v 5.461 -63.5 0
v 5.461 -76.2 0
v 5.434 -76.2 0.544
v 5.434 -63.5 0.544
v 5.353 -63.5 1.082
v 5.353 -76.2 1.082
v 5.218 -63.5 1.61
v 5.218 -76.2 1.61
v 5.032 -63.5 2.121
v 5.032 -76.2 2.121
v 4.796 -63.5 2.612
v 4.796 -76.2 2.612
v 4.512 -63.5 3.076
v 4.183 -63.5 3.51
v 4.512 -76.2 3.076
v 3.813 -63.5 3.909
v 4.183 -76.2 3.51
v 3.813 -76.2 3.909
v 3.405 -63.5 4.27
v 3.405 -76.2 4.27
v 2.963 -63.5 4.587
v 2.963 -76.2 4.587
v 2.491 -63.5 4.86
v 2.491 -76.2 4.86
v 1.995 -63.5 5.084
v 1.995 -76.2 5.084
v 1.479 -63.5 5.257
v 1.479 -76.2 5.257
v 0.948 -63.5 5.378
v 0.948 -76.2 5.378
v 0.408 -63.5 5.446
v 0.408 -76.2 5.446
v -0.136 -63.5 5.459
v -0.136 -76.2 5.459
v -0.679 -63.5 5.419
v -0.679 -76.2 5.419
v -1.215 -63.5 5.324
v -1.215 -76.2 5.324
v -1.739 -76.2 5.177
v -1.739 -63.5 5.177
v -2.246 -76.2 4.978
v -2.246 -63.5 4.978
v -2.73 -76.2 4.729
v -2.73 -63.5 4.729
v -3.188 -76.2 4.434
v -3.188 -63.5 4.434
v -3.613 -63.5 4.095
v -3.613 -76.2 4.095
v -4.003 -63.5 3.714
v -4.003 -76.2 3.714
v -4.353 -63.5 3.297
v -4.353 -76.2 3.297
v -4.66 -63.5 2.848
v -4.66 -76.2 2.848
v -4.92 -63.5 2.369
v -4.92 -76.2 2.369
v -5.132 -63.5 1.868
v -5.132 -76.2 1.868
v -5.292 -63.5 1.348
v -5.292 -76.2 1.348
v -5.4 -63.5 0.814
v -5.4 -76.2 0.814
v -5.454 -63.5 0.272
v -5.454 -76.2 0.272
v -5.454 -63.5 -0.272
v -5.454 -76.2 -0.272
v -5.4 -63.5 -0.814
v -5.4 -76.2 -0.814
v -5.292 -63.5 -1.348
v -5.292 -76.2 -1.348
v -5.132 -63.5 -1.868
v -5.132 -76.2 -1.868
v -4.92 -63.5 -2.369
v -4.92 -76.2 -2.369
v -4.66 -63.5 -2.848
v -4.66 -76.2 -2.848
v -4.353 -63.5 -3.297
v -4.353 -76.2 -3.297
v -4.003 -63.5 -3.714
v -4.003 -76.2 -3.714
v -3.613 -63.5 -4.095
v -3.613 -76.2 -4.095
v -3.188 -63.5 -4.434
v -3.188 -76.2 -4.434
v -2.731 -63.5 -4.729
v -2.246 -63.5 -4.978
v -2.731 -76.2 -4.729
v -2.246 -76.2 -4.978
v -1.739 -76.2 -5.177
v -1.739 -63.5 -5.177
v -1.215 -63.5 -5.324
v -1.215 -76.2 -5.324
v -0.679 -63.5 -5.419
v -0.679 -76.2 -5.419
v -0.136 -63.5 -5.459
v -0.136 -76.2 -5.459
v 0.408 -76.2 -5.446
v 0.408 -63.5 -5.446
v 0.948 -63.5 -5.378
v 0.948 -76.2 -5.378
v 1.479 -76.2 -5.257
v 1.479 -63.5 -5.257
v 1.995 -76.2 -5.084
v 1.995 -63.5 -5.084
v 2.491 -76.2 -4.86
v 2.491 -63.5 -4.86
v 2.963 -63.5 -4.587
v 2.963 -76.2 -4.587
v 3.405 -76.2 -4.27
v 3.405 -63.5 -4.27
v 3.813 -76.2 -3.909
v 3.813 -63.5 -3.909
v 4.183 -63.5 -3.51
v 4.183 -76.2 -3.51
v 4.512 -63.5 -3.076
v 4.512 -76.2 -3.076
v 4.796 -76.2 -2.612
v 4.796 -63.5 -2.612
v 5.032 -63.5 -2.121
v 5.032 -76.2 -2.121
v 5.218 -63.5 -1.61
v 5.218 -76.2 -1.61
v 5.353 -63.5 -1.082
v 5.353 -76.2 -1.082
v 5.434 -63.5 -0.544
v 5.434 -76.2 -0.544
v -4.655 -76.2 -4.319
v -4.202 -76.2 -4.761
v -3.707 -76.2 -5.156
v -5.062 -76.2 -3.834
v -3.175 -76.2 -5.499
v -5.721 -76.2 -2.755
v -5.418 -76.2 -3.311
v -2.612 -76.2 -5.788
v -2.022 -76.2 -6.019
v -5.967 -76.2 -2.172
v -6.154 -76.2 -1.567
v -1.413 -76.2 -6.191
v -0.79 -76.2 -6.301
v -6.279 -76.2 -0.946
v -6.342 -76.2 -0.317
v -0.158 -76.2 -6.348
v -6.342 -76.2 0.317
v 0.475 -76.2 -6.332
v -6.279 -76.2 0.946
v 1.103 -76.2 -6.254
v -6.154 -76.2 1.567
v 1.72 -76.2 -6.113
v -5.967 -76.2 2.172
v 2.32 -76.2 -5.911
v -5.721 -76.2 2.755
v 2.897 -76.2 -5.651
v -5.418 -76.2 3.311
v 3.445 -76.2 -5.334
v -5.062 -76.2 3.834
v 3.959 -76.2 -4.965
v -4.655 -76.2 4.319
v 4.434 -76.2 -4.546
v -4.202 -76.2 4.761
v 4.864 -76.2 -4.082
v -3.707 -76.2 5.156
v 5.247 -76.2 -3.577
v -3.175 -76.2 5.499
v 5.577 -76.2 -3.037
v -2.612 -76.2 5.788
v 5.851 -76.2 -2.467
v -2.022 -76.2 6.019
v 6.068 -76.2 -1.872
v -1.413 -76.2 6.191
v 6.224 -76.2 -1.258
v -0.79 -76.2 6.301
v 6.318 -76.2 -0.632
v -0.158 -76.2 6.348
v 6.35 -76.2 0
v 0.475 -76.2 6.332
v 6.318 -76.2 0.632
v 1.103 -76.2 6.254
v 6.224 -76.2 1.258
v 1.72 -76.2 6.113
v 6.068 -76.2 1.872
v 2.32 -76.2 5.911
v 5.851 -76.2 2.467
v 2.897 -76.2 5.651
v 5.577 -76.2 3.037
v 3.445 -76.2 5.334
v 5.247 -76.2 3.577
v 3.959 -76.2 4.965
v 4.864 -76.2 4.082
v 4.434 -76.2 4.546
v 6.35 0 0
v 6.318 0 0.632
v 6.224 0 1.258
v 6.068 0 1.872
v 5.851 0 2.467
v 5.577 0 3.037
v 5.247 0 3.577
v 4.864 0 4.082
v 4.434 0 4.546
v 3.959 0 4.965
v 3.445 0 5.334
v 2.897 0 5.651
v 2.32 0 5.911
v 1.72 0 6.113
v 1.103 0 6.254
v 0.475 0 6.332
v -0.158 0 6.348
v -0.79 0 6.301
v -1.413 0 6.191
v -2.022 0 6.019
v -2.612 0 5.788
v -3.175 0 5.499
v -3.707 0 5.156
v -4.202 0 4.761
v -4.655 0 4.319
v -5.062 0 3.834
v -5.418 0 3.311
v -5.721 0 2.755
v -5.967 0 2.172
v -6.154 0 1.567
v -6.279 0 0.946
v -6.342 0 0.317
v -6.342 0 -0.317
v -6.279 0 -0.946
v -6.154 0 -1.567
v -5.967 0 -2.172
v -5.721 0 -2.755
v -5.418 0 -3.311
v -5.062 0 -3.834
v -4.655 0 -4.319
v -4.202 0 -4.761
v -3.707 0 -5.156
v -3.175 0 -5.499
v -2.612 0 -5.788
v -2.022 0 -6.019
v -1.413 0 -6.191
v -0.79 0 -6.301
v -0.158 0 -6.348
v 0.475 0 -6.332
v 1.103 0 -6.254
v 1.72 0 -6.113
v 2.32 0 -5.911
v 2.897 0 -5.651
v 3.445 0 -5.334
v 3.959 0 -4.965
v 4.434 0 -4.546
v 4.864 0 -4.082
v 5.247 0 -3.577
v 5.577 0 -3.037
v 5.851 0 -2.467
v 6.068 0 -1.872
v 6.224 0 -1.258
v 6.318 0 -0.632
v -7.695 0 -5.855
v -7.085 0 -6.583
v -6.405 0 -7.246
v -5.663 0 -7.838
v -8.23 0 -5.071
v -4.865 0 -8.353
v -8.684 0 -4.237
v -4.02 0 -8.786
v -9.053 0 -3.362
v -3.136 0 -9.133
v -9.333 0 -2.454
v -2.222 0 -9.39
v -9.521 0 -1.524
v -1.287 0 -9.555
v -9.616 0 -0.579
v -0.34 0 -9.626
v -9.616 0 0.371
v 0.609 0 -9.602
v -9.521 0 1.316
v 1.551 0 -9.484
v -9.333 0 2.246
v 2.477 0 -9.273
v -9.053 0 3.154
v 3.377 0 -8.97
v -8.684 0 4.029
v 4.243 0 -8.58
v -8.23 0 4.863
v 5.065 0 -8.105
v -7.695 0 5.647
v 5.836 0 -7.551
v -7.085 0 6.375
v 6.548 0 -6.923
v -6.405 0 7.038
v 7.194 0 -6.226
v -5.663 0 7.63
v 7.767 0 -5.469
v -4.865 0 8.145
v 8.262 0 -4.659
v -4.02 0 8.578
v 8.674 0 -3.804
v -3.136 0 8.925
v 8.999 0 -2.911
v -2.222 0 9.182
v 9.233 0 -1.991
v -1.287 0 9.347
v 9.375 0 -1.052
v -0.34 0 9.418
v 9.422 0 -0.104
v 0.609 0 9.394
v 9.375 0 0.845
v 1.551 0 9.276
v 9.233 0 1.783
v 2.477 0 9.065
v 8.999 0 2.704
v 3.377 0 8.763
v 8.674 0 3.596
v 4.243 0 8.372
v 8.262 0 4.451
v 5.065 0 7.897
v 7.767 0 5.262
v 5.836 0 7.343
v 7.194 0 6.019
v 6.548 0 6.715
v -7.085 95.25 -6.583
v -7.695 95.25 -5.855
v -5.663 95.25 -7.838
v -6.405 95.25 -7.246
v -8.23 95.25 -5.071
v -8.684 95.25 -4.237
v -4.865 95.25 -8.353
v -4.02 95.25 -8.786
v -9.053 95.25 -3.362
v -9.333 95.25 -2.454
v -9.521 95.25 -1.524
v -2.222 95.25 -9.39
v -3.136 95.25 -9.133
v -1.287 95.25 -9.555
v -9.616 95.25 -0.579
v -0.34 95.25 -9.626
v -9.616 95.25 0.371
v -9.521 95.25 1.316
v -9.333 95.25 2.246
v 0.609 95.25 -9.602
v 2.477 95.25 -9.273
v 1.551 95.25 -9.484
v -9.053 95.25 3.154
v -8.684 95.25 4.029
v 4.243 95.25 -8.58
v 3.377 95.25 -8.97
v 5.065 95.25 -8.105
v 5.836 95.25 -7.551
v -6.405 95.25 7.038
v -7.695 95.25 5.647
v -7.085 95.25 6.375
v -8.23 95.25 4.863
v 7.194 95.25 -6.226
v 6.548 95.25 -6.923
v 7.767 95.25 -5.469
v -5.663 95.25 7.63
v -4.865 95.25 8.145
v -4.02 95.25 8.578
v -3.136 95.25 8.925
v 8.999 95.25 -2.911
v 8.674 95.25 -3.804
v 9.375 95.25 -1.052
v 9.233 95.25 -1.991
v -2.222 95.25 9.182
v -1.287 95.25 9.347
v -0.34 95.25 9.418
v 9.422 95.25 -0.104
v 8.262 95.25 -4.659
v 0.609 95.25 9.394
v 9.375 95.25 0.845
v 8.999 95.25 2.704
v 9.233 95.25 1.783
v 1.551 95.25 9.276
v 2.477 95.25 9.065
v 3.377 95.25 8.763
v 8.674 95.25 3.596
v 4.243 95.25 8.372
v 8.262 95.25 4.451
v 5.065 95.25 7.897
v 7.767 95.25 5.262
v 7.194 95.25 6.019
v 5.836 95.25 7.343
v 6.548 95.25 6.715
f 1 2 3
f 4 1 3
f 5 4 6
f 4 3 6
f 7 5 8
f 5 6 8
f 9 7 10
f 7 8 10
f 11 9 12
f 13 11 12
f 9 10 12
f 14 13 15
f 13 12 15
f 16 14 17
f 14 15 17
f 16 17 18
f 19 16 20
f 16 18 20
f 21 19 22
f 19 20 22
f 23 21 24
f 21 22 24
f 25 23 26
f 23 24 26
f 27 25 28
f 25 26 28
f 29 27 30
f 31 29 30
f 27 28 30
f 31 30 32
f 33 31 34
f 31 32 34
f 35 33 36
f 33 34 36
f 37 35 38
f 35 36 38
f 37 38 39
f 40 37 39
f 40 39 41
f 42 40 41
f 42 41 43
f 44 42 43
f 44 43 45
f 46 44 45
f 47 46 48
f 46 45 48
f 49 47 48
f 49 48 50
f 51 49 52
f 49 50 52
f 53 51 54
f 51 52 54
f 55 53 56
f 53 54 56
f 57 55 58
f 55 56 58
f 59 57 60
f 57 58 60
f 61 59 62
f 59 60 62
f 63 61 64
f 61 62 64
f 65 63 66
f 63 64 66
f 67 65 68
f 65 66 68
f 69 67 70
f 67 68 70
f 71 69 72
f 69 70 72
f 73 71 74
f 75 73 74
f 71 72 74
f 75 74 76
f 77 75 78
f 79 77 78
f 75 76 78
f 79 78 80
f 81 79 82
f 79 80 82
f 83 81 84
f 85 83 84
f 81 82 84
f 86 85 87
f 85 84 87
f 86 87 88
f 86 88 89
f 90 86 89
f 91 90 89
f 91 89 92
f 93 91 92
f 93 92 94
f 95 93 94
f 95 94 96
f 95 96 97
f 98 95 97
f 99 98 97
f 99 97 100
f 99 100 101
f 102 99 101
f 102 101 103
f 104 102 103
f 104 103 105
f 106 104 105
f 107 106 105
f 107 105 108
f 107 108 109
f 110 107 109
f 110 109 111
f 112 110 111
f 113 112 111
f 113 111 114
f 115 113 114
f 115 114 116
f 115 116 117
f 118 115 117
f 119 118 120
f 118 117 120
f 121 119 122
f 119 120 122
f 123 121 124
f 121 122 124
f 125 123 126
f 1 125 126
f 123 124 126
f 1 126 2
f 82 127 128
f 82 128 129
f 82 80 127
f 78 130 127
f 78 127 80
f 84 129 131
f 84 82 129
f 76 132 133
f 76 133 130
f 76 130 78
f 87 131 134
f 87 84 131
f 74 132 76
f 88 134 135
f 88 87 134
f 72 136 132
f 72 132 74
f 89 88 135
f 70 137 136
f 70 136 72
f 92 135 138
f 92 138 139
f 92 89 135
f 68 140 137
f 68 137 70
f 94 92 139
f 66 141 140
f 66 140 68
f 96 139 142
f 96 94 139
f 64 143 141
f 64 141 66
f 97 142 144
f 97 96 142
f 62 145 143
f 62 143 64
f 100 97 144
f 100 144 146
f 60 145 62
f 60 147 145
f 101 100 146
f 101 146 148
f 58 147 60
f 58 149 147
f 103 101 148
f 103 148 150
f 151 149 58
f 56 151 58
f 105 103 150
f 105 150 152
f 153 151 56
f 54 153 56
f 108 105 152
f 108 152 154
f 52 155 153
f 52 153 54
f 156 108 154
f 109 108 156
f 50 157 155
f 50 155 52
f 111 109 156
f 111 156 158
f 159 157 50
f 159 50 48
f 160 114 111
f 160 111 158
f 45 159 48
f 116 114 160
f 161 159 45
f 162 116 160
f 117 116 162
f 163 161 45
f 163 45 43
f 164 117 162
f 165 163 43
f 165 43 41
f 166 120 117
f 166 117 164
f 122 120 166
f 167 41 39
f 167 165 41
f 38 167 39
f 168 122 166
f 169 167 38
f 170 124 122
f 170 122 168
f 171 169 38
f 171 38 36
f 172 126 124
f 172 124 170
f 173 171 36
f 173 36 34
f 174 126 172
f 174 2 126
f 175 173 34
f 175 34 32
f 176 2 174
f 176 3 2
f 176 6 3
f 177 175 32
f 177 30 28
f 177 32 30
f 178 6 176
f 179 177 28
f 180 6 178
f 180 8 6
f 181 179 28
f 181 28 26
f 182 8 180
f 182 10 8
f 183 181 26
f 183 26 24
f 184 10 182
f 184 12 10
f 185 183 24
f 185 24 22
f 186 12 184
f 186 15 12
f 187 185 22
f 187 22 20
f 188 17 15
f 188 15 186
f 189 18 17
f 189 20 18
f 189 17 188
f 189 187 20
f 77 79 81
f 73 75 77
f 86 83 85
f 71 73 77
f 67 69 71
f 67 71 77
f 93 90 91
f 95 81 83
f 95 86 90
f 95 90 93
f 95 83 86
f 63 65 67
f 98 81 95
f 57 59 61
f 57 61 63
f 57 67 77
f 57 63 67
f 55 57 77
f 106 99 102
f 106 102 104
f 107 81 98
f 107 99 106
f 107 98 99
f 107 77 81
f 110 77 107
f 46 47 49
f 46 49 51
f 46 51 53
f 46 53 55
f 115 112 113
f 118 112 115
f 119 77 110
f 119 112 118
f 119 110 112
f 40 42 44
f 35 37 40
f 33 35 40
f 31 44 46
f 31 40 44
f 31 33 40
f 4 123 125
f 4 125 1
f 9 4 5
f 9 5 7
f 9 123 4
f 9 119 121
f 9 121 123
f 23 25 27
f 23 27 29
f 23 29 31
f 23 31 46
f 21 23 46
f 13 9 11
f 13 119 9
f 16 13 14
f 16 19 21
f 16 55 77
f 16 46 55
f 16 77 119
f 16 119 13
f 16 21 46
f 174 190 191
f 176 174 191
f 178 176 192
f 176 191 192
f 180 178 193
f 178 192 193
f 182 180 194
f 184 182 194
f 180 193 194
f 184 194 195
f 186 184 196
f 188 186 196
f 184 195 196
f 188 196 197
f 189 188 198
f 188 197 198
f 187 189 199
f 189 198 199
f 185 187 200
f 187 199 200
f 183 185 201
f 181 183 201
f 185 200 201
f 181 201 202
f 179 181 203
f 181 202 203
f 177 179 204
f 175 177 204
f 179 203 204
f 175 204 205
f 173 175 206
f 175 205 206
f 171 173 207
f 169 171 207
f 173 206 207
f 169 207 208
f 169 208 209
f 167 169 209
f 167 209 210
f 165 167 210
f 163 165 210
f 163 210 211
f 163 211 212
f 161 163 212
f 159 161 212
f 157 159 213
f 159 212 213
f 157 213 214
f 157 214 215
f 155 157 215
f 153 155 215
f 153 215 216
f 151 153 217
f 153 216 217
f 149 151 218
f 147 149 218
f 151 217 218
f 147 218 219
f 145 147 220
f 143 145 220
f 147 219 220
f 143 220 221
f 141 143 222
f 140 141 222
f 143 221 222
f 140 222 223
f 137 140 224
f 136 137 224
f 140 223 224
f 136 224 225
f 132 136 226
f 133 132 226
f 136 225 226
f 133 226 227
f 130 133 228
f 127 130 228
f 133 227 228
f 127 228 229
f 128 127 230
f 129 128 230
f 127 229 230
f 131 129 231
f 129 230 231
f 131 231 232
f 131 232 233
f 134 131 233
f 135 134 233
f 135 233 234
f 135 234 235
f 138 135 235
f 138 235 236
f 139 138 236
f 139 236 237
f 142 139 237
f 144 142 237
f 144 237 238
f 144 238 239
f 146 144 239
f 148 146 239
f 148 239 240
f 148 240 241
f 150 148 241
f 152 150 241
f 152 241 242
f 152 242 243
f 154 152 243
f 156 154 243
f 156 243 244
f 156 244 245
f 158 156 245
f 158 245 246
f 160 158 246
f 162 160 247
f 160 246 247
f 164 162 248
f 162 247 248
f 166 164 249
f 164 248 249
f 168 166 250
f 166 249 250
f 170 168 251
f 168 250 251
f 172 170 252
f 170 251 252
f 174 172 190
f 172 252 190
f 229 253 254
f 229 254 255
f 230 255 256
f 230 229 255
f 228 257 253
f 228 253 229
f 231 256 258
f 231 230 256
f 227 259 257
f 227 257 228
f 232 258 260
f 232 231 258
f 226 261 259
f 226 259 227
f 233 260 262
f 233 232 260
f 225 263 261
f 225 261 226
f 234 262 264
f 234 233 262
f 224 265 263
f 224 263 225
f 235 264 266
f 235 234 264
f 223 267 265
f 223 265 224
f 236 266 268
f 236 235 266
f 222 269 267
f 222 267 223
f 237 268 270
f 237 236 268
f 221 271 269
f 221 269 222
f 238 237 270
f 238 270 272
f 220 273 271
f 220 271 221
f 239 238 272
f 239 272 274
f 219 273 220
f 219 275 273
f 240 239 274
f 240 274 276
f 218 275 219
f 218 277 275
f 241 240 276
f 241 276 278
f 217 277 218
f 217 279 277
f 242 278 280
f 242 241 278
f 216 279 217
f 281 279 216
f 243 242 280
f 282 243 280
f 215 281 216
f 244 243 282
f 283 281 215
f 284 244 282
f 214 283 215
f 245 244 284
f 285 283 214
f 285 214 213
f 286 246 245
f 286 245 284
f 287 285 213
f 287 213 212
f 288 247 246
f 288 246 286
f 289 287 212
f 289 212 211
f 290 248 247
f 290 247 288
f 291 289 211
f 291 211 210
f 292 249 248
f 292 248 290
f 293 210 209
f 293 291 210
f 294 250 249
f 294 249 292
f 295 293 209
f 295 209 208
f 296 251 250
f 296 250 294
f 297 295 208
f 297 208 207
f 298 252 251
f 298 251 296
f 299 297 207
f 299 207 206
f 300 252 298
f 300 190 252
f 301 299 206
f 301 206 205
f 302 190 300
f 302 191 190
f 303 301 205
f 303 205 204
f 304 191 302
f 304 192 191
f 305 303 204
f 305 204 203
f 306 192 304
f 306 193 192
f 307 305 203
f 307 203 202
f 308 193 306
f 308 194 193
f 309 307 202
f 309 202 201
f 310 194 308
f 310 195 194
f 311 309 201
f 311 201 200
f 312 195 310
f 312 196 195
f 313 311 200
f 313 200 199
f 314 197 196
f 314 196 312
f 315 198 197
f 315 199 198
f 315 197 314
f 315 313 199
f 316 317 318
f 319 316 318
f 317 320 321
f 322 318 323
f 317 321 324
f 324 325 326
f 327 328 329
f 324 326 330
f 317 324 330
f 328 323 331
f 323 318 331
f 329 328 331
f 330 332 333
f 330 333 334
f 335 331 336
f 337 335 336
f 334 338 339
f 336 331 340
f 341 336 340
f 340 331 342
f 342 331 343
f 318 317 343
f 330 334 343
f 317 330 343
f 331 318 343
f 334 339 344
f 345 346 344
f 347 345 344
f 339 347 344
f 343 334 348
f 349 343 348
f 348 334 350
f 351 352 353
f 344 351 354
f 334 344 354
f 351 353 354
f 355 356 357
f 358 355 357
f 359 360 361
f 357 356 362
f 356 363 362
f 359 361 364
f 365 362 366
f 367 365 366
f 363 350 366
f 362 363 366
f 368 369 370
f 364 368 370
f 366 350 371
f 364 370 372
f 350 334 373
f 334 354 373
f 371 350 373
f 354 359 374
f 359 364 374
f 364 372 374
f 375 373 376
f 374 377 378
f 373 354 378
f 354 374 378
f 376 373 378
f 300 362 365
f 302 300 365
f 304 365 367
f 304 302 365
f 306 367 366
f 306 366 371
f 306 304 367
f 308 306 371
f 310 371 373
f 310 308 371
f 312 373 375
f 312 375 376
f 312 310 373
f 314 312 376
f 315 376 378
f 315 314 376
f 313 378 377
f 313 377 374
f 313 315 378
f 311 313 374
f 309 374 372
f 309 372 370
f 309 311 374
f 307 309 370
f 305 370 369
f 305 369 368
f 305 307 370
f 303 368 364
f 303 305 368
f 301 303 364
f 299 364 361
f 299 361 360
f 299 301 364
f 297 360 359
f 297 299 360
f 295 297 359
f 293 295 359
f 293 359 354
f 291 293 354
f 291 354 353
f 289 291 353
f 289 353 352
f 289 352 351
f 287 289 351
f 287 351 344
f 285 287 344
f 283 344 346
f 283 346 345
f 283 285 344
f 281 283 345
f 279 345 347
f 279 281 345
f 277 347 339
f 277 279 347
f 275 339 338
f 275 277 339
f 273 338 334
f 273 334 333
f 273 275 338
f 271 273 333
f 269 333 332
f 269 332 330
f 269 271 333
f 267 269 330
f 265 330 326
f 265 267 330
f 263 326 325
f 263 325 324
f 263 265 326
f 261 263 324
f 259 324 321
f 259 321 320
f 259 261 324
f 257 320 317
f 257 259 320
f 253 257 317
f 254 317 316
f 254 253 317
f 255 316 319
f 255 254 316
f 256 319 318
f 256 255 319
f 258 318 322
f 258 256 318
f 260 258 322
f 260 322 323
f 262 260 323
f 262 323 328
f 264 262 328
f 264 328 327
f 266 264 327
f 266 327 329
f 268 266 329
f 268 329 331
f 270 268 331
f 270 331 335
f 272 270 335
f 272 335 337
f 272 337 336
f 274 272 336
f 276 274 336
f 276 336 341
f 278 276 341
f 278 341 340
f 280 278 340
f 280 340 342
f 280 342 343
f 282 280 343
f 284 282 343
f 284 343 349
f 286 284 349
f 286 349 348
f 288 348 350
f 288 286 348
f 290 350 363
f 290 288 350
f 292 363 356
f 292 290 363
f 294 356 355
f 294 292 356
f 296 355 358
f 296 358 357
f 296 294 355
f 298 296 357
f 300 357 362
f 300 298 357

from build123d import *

# Parameters (mm, degrees)
F0_R     = 9.525
F1_DEPTH = 95.25
F2_R     = 6.35
F3_DEPTH = 76.2
F4_R     = 5.461
F5_DEPTH = 12.7


with BuildPart() as f1:
    # F0 (on Front) → F1 (new body)
    with BuildSketch(Plane.XZ):
        with Locations((-0.102708, -0.103876)):
            Circle(F0_R)
    extrude(amount=-F1_DEPTH)

    # F2 (on face) → F3 (join)
    with BuildSketch(Plane.XZ):
        Circle(F2_R)
    extrude(amount=F3_DEPTH)

    # F4 (on face) → F5 (cut)
    with BuildSketch(Plane.XZ.offset(76.2)):
        Circle(F4_R)
    extrude(amount=-F5_DEPTH, mode=Mode.SUBTRACT)


solid = f1.part
